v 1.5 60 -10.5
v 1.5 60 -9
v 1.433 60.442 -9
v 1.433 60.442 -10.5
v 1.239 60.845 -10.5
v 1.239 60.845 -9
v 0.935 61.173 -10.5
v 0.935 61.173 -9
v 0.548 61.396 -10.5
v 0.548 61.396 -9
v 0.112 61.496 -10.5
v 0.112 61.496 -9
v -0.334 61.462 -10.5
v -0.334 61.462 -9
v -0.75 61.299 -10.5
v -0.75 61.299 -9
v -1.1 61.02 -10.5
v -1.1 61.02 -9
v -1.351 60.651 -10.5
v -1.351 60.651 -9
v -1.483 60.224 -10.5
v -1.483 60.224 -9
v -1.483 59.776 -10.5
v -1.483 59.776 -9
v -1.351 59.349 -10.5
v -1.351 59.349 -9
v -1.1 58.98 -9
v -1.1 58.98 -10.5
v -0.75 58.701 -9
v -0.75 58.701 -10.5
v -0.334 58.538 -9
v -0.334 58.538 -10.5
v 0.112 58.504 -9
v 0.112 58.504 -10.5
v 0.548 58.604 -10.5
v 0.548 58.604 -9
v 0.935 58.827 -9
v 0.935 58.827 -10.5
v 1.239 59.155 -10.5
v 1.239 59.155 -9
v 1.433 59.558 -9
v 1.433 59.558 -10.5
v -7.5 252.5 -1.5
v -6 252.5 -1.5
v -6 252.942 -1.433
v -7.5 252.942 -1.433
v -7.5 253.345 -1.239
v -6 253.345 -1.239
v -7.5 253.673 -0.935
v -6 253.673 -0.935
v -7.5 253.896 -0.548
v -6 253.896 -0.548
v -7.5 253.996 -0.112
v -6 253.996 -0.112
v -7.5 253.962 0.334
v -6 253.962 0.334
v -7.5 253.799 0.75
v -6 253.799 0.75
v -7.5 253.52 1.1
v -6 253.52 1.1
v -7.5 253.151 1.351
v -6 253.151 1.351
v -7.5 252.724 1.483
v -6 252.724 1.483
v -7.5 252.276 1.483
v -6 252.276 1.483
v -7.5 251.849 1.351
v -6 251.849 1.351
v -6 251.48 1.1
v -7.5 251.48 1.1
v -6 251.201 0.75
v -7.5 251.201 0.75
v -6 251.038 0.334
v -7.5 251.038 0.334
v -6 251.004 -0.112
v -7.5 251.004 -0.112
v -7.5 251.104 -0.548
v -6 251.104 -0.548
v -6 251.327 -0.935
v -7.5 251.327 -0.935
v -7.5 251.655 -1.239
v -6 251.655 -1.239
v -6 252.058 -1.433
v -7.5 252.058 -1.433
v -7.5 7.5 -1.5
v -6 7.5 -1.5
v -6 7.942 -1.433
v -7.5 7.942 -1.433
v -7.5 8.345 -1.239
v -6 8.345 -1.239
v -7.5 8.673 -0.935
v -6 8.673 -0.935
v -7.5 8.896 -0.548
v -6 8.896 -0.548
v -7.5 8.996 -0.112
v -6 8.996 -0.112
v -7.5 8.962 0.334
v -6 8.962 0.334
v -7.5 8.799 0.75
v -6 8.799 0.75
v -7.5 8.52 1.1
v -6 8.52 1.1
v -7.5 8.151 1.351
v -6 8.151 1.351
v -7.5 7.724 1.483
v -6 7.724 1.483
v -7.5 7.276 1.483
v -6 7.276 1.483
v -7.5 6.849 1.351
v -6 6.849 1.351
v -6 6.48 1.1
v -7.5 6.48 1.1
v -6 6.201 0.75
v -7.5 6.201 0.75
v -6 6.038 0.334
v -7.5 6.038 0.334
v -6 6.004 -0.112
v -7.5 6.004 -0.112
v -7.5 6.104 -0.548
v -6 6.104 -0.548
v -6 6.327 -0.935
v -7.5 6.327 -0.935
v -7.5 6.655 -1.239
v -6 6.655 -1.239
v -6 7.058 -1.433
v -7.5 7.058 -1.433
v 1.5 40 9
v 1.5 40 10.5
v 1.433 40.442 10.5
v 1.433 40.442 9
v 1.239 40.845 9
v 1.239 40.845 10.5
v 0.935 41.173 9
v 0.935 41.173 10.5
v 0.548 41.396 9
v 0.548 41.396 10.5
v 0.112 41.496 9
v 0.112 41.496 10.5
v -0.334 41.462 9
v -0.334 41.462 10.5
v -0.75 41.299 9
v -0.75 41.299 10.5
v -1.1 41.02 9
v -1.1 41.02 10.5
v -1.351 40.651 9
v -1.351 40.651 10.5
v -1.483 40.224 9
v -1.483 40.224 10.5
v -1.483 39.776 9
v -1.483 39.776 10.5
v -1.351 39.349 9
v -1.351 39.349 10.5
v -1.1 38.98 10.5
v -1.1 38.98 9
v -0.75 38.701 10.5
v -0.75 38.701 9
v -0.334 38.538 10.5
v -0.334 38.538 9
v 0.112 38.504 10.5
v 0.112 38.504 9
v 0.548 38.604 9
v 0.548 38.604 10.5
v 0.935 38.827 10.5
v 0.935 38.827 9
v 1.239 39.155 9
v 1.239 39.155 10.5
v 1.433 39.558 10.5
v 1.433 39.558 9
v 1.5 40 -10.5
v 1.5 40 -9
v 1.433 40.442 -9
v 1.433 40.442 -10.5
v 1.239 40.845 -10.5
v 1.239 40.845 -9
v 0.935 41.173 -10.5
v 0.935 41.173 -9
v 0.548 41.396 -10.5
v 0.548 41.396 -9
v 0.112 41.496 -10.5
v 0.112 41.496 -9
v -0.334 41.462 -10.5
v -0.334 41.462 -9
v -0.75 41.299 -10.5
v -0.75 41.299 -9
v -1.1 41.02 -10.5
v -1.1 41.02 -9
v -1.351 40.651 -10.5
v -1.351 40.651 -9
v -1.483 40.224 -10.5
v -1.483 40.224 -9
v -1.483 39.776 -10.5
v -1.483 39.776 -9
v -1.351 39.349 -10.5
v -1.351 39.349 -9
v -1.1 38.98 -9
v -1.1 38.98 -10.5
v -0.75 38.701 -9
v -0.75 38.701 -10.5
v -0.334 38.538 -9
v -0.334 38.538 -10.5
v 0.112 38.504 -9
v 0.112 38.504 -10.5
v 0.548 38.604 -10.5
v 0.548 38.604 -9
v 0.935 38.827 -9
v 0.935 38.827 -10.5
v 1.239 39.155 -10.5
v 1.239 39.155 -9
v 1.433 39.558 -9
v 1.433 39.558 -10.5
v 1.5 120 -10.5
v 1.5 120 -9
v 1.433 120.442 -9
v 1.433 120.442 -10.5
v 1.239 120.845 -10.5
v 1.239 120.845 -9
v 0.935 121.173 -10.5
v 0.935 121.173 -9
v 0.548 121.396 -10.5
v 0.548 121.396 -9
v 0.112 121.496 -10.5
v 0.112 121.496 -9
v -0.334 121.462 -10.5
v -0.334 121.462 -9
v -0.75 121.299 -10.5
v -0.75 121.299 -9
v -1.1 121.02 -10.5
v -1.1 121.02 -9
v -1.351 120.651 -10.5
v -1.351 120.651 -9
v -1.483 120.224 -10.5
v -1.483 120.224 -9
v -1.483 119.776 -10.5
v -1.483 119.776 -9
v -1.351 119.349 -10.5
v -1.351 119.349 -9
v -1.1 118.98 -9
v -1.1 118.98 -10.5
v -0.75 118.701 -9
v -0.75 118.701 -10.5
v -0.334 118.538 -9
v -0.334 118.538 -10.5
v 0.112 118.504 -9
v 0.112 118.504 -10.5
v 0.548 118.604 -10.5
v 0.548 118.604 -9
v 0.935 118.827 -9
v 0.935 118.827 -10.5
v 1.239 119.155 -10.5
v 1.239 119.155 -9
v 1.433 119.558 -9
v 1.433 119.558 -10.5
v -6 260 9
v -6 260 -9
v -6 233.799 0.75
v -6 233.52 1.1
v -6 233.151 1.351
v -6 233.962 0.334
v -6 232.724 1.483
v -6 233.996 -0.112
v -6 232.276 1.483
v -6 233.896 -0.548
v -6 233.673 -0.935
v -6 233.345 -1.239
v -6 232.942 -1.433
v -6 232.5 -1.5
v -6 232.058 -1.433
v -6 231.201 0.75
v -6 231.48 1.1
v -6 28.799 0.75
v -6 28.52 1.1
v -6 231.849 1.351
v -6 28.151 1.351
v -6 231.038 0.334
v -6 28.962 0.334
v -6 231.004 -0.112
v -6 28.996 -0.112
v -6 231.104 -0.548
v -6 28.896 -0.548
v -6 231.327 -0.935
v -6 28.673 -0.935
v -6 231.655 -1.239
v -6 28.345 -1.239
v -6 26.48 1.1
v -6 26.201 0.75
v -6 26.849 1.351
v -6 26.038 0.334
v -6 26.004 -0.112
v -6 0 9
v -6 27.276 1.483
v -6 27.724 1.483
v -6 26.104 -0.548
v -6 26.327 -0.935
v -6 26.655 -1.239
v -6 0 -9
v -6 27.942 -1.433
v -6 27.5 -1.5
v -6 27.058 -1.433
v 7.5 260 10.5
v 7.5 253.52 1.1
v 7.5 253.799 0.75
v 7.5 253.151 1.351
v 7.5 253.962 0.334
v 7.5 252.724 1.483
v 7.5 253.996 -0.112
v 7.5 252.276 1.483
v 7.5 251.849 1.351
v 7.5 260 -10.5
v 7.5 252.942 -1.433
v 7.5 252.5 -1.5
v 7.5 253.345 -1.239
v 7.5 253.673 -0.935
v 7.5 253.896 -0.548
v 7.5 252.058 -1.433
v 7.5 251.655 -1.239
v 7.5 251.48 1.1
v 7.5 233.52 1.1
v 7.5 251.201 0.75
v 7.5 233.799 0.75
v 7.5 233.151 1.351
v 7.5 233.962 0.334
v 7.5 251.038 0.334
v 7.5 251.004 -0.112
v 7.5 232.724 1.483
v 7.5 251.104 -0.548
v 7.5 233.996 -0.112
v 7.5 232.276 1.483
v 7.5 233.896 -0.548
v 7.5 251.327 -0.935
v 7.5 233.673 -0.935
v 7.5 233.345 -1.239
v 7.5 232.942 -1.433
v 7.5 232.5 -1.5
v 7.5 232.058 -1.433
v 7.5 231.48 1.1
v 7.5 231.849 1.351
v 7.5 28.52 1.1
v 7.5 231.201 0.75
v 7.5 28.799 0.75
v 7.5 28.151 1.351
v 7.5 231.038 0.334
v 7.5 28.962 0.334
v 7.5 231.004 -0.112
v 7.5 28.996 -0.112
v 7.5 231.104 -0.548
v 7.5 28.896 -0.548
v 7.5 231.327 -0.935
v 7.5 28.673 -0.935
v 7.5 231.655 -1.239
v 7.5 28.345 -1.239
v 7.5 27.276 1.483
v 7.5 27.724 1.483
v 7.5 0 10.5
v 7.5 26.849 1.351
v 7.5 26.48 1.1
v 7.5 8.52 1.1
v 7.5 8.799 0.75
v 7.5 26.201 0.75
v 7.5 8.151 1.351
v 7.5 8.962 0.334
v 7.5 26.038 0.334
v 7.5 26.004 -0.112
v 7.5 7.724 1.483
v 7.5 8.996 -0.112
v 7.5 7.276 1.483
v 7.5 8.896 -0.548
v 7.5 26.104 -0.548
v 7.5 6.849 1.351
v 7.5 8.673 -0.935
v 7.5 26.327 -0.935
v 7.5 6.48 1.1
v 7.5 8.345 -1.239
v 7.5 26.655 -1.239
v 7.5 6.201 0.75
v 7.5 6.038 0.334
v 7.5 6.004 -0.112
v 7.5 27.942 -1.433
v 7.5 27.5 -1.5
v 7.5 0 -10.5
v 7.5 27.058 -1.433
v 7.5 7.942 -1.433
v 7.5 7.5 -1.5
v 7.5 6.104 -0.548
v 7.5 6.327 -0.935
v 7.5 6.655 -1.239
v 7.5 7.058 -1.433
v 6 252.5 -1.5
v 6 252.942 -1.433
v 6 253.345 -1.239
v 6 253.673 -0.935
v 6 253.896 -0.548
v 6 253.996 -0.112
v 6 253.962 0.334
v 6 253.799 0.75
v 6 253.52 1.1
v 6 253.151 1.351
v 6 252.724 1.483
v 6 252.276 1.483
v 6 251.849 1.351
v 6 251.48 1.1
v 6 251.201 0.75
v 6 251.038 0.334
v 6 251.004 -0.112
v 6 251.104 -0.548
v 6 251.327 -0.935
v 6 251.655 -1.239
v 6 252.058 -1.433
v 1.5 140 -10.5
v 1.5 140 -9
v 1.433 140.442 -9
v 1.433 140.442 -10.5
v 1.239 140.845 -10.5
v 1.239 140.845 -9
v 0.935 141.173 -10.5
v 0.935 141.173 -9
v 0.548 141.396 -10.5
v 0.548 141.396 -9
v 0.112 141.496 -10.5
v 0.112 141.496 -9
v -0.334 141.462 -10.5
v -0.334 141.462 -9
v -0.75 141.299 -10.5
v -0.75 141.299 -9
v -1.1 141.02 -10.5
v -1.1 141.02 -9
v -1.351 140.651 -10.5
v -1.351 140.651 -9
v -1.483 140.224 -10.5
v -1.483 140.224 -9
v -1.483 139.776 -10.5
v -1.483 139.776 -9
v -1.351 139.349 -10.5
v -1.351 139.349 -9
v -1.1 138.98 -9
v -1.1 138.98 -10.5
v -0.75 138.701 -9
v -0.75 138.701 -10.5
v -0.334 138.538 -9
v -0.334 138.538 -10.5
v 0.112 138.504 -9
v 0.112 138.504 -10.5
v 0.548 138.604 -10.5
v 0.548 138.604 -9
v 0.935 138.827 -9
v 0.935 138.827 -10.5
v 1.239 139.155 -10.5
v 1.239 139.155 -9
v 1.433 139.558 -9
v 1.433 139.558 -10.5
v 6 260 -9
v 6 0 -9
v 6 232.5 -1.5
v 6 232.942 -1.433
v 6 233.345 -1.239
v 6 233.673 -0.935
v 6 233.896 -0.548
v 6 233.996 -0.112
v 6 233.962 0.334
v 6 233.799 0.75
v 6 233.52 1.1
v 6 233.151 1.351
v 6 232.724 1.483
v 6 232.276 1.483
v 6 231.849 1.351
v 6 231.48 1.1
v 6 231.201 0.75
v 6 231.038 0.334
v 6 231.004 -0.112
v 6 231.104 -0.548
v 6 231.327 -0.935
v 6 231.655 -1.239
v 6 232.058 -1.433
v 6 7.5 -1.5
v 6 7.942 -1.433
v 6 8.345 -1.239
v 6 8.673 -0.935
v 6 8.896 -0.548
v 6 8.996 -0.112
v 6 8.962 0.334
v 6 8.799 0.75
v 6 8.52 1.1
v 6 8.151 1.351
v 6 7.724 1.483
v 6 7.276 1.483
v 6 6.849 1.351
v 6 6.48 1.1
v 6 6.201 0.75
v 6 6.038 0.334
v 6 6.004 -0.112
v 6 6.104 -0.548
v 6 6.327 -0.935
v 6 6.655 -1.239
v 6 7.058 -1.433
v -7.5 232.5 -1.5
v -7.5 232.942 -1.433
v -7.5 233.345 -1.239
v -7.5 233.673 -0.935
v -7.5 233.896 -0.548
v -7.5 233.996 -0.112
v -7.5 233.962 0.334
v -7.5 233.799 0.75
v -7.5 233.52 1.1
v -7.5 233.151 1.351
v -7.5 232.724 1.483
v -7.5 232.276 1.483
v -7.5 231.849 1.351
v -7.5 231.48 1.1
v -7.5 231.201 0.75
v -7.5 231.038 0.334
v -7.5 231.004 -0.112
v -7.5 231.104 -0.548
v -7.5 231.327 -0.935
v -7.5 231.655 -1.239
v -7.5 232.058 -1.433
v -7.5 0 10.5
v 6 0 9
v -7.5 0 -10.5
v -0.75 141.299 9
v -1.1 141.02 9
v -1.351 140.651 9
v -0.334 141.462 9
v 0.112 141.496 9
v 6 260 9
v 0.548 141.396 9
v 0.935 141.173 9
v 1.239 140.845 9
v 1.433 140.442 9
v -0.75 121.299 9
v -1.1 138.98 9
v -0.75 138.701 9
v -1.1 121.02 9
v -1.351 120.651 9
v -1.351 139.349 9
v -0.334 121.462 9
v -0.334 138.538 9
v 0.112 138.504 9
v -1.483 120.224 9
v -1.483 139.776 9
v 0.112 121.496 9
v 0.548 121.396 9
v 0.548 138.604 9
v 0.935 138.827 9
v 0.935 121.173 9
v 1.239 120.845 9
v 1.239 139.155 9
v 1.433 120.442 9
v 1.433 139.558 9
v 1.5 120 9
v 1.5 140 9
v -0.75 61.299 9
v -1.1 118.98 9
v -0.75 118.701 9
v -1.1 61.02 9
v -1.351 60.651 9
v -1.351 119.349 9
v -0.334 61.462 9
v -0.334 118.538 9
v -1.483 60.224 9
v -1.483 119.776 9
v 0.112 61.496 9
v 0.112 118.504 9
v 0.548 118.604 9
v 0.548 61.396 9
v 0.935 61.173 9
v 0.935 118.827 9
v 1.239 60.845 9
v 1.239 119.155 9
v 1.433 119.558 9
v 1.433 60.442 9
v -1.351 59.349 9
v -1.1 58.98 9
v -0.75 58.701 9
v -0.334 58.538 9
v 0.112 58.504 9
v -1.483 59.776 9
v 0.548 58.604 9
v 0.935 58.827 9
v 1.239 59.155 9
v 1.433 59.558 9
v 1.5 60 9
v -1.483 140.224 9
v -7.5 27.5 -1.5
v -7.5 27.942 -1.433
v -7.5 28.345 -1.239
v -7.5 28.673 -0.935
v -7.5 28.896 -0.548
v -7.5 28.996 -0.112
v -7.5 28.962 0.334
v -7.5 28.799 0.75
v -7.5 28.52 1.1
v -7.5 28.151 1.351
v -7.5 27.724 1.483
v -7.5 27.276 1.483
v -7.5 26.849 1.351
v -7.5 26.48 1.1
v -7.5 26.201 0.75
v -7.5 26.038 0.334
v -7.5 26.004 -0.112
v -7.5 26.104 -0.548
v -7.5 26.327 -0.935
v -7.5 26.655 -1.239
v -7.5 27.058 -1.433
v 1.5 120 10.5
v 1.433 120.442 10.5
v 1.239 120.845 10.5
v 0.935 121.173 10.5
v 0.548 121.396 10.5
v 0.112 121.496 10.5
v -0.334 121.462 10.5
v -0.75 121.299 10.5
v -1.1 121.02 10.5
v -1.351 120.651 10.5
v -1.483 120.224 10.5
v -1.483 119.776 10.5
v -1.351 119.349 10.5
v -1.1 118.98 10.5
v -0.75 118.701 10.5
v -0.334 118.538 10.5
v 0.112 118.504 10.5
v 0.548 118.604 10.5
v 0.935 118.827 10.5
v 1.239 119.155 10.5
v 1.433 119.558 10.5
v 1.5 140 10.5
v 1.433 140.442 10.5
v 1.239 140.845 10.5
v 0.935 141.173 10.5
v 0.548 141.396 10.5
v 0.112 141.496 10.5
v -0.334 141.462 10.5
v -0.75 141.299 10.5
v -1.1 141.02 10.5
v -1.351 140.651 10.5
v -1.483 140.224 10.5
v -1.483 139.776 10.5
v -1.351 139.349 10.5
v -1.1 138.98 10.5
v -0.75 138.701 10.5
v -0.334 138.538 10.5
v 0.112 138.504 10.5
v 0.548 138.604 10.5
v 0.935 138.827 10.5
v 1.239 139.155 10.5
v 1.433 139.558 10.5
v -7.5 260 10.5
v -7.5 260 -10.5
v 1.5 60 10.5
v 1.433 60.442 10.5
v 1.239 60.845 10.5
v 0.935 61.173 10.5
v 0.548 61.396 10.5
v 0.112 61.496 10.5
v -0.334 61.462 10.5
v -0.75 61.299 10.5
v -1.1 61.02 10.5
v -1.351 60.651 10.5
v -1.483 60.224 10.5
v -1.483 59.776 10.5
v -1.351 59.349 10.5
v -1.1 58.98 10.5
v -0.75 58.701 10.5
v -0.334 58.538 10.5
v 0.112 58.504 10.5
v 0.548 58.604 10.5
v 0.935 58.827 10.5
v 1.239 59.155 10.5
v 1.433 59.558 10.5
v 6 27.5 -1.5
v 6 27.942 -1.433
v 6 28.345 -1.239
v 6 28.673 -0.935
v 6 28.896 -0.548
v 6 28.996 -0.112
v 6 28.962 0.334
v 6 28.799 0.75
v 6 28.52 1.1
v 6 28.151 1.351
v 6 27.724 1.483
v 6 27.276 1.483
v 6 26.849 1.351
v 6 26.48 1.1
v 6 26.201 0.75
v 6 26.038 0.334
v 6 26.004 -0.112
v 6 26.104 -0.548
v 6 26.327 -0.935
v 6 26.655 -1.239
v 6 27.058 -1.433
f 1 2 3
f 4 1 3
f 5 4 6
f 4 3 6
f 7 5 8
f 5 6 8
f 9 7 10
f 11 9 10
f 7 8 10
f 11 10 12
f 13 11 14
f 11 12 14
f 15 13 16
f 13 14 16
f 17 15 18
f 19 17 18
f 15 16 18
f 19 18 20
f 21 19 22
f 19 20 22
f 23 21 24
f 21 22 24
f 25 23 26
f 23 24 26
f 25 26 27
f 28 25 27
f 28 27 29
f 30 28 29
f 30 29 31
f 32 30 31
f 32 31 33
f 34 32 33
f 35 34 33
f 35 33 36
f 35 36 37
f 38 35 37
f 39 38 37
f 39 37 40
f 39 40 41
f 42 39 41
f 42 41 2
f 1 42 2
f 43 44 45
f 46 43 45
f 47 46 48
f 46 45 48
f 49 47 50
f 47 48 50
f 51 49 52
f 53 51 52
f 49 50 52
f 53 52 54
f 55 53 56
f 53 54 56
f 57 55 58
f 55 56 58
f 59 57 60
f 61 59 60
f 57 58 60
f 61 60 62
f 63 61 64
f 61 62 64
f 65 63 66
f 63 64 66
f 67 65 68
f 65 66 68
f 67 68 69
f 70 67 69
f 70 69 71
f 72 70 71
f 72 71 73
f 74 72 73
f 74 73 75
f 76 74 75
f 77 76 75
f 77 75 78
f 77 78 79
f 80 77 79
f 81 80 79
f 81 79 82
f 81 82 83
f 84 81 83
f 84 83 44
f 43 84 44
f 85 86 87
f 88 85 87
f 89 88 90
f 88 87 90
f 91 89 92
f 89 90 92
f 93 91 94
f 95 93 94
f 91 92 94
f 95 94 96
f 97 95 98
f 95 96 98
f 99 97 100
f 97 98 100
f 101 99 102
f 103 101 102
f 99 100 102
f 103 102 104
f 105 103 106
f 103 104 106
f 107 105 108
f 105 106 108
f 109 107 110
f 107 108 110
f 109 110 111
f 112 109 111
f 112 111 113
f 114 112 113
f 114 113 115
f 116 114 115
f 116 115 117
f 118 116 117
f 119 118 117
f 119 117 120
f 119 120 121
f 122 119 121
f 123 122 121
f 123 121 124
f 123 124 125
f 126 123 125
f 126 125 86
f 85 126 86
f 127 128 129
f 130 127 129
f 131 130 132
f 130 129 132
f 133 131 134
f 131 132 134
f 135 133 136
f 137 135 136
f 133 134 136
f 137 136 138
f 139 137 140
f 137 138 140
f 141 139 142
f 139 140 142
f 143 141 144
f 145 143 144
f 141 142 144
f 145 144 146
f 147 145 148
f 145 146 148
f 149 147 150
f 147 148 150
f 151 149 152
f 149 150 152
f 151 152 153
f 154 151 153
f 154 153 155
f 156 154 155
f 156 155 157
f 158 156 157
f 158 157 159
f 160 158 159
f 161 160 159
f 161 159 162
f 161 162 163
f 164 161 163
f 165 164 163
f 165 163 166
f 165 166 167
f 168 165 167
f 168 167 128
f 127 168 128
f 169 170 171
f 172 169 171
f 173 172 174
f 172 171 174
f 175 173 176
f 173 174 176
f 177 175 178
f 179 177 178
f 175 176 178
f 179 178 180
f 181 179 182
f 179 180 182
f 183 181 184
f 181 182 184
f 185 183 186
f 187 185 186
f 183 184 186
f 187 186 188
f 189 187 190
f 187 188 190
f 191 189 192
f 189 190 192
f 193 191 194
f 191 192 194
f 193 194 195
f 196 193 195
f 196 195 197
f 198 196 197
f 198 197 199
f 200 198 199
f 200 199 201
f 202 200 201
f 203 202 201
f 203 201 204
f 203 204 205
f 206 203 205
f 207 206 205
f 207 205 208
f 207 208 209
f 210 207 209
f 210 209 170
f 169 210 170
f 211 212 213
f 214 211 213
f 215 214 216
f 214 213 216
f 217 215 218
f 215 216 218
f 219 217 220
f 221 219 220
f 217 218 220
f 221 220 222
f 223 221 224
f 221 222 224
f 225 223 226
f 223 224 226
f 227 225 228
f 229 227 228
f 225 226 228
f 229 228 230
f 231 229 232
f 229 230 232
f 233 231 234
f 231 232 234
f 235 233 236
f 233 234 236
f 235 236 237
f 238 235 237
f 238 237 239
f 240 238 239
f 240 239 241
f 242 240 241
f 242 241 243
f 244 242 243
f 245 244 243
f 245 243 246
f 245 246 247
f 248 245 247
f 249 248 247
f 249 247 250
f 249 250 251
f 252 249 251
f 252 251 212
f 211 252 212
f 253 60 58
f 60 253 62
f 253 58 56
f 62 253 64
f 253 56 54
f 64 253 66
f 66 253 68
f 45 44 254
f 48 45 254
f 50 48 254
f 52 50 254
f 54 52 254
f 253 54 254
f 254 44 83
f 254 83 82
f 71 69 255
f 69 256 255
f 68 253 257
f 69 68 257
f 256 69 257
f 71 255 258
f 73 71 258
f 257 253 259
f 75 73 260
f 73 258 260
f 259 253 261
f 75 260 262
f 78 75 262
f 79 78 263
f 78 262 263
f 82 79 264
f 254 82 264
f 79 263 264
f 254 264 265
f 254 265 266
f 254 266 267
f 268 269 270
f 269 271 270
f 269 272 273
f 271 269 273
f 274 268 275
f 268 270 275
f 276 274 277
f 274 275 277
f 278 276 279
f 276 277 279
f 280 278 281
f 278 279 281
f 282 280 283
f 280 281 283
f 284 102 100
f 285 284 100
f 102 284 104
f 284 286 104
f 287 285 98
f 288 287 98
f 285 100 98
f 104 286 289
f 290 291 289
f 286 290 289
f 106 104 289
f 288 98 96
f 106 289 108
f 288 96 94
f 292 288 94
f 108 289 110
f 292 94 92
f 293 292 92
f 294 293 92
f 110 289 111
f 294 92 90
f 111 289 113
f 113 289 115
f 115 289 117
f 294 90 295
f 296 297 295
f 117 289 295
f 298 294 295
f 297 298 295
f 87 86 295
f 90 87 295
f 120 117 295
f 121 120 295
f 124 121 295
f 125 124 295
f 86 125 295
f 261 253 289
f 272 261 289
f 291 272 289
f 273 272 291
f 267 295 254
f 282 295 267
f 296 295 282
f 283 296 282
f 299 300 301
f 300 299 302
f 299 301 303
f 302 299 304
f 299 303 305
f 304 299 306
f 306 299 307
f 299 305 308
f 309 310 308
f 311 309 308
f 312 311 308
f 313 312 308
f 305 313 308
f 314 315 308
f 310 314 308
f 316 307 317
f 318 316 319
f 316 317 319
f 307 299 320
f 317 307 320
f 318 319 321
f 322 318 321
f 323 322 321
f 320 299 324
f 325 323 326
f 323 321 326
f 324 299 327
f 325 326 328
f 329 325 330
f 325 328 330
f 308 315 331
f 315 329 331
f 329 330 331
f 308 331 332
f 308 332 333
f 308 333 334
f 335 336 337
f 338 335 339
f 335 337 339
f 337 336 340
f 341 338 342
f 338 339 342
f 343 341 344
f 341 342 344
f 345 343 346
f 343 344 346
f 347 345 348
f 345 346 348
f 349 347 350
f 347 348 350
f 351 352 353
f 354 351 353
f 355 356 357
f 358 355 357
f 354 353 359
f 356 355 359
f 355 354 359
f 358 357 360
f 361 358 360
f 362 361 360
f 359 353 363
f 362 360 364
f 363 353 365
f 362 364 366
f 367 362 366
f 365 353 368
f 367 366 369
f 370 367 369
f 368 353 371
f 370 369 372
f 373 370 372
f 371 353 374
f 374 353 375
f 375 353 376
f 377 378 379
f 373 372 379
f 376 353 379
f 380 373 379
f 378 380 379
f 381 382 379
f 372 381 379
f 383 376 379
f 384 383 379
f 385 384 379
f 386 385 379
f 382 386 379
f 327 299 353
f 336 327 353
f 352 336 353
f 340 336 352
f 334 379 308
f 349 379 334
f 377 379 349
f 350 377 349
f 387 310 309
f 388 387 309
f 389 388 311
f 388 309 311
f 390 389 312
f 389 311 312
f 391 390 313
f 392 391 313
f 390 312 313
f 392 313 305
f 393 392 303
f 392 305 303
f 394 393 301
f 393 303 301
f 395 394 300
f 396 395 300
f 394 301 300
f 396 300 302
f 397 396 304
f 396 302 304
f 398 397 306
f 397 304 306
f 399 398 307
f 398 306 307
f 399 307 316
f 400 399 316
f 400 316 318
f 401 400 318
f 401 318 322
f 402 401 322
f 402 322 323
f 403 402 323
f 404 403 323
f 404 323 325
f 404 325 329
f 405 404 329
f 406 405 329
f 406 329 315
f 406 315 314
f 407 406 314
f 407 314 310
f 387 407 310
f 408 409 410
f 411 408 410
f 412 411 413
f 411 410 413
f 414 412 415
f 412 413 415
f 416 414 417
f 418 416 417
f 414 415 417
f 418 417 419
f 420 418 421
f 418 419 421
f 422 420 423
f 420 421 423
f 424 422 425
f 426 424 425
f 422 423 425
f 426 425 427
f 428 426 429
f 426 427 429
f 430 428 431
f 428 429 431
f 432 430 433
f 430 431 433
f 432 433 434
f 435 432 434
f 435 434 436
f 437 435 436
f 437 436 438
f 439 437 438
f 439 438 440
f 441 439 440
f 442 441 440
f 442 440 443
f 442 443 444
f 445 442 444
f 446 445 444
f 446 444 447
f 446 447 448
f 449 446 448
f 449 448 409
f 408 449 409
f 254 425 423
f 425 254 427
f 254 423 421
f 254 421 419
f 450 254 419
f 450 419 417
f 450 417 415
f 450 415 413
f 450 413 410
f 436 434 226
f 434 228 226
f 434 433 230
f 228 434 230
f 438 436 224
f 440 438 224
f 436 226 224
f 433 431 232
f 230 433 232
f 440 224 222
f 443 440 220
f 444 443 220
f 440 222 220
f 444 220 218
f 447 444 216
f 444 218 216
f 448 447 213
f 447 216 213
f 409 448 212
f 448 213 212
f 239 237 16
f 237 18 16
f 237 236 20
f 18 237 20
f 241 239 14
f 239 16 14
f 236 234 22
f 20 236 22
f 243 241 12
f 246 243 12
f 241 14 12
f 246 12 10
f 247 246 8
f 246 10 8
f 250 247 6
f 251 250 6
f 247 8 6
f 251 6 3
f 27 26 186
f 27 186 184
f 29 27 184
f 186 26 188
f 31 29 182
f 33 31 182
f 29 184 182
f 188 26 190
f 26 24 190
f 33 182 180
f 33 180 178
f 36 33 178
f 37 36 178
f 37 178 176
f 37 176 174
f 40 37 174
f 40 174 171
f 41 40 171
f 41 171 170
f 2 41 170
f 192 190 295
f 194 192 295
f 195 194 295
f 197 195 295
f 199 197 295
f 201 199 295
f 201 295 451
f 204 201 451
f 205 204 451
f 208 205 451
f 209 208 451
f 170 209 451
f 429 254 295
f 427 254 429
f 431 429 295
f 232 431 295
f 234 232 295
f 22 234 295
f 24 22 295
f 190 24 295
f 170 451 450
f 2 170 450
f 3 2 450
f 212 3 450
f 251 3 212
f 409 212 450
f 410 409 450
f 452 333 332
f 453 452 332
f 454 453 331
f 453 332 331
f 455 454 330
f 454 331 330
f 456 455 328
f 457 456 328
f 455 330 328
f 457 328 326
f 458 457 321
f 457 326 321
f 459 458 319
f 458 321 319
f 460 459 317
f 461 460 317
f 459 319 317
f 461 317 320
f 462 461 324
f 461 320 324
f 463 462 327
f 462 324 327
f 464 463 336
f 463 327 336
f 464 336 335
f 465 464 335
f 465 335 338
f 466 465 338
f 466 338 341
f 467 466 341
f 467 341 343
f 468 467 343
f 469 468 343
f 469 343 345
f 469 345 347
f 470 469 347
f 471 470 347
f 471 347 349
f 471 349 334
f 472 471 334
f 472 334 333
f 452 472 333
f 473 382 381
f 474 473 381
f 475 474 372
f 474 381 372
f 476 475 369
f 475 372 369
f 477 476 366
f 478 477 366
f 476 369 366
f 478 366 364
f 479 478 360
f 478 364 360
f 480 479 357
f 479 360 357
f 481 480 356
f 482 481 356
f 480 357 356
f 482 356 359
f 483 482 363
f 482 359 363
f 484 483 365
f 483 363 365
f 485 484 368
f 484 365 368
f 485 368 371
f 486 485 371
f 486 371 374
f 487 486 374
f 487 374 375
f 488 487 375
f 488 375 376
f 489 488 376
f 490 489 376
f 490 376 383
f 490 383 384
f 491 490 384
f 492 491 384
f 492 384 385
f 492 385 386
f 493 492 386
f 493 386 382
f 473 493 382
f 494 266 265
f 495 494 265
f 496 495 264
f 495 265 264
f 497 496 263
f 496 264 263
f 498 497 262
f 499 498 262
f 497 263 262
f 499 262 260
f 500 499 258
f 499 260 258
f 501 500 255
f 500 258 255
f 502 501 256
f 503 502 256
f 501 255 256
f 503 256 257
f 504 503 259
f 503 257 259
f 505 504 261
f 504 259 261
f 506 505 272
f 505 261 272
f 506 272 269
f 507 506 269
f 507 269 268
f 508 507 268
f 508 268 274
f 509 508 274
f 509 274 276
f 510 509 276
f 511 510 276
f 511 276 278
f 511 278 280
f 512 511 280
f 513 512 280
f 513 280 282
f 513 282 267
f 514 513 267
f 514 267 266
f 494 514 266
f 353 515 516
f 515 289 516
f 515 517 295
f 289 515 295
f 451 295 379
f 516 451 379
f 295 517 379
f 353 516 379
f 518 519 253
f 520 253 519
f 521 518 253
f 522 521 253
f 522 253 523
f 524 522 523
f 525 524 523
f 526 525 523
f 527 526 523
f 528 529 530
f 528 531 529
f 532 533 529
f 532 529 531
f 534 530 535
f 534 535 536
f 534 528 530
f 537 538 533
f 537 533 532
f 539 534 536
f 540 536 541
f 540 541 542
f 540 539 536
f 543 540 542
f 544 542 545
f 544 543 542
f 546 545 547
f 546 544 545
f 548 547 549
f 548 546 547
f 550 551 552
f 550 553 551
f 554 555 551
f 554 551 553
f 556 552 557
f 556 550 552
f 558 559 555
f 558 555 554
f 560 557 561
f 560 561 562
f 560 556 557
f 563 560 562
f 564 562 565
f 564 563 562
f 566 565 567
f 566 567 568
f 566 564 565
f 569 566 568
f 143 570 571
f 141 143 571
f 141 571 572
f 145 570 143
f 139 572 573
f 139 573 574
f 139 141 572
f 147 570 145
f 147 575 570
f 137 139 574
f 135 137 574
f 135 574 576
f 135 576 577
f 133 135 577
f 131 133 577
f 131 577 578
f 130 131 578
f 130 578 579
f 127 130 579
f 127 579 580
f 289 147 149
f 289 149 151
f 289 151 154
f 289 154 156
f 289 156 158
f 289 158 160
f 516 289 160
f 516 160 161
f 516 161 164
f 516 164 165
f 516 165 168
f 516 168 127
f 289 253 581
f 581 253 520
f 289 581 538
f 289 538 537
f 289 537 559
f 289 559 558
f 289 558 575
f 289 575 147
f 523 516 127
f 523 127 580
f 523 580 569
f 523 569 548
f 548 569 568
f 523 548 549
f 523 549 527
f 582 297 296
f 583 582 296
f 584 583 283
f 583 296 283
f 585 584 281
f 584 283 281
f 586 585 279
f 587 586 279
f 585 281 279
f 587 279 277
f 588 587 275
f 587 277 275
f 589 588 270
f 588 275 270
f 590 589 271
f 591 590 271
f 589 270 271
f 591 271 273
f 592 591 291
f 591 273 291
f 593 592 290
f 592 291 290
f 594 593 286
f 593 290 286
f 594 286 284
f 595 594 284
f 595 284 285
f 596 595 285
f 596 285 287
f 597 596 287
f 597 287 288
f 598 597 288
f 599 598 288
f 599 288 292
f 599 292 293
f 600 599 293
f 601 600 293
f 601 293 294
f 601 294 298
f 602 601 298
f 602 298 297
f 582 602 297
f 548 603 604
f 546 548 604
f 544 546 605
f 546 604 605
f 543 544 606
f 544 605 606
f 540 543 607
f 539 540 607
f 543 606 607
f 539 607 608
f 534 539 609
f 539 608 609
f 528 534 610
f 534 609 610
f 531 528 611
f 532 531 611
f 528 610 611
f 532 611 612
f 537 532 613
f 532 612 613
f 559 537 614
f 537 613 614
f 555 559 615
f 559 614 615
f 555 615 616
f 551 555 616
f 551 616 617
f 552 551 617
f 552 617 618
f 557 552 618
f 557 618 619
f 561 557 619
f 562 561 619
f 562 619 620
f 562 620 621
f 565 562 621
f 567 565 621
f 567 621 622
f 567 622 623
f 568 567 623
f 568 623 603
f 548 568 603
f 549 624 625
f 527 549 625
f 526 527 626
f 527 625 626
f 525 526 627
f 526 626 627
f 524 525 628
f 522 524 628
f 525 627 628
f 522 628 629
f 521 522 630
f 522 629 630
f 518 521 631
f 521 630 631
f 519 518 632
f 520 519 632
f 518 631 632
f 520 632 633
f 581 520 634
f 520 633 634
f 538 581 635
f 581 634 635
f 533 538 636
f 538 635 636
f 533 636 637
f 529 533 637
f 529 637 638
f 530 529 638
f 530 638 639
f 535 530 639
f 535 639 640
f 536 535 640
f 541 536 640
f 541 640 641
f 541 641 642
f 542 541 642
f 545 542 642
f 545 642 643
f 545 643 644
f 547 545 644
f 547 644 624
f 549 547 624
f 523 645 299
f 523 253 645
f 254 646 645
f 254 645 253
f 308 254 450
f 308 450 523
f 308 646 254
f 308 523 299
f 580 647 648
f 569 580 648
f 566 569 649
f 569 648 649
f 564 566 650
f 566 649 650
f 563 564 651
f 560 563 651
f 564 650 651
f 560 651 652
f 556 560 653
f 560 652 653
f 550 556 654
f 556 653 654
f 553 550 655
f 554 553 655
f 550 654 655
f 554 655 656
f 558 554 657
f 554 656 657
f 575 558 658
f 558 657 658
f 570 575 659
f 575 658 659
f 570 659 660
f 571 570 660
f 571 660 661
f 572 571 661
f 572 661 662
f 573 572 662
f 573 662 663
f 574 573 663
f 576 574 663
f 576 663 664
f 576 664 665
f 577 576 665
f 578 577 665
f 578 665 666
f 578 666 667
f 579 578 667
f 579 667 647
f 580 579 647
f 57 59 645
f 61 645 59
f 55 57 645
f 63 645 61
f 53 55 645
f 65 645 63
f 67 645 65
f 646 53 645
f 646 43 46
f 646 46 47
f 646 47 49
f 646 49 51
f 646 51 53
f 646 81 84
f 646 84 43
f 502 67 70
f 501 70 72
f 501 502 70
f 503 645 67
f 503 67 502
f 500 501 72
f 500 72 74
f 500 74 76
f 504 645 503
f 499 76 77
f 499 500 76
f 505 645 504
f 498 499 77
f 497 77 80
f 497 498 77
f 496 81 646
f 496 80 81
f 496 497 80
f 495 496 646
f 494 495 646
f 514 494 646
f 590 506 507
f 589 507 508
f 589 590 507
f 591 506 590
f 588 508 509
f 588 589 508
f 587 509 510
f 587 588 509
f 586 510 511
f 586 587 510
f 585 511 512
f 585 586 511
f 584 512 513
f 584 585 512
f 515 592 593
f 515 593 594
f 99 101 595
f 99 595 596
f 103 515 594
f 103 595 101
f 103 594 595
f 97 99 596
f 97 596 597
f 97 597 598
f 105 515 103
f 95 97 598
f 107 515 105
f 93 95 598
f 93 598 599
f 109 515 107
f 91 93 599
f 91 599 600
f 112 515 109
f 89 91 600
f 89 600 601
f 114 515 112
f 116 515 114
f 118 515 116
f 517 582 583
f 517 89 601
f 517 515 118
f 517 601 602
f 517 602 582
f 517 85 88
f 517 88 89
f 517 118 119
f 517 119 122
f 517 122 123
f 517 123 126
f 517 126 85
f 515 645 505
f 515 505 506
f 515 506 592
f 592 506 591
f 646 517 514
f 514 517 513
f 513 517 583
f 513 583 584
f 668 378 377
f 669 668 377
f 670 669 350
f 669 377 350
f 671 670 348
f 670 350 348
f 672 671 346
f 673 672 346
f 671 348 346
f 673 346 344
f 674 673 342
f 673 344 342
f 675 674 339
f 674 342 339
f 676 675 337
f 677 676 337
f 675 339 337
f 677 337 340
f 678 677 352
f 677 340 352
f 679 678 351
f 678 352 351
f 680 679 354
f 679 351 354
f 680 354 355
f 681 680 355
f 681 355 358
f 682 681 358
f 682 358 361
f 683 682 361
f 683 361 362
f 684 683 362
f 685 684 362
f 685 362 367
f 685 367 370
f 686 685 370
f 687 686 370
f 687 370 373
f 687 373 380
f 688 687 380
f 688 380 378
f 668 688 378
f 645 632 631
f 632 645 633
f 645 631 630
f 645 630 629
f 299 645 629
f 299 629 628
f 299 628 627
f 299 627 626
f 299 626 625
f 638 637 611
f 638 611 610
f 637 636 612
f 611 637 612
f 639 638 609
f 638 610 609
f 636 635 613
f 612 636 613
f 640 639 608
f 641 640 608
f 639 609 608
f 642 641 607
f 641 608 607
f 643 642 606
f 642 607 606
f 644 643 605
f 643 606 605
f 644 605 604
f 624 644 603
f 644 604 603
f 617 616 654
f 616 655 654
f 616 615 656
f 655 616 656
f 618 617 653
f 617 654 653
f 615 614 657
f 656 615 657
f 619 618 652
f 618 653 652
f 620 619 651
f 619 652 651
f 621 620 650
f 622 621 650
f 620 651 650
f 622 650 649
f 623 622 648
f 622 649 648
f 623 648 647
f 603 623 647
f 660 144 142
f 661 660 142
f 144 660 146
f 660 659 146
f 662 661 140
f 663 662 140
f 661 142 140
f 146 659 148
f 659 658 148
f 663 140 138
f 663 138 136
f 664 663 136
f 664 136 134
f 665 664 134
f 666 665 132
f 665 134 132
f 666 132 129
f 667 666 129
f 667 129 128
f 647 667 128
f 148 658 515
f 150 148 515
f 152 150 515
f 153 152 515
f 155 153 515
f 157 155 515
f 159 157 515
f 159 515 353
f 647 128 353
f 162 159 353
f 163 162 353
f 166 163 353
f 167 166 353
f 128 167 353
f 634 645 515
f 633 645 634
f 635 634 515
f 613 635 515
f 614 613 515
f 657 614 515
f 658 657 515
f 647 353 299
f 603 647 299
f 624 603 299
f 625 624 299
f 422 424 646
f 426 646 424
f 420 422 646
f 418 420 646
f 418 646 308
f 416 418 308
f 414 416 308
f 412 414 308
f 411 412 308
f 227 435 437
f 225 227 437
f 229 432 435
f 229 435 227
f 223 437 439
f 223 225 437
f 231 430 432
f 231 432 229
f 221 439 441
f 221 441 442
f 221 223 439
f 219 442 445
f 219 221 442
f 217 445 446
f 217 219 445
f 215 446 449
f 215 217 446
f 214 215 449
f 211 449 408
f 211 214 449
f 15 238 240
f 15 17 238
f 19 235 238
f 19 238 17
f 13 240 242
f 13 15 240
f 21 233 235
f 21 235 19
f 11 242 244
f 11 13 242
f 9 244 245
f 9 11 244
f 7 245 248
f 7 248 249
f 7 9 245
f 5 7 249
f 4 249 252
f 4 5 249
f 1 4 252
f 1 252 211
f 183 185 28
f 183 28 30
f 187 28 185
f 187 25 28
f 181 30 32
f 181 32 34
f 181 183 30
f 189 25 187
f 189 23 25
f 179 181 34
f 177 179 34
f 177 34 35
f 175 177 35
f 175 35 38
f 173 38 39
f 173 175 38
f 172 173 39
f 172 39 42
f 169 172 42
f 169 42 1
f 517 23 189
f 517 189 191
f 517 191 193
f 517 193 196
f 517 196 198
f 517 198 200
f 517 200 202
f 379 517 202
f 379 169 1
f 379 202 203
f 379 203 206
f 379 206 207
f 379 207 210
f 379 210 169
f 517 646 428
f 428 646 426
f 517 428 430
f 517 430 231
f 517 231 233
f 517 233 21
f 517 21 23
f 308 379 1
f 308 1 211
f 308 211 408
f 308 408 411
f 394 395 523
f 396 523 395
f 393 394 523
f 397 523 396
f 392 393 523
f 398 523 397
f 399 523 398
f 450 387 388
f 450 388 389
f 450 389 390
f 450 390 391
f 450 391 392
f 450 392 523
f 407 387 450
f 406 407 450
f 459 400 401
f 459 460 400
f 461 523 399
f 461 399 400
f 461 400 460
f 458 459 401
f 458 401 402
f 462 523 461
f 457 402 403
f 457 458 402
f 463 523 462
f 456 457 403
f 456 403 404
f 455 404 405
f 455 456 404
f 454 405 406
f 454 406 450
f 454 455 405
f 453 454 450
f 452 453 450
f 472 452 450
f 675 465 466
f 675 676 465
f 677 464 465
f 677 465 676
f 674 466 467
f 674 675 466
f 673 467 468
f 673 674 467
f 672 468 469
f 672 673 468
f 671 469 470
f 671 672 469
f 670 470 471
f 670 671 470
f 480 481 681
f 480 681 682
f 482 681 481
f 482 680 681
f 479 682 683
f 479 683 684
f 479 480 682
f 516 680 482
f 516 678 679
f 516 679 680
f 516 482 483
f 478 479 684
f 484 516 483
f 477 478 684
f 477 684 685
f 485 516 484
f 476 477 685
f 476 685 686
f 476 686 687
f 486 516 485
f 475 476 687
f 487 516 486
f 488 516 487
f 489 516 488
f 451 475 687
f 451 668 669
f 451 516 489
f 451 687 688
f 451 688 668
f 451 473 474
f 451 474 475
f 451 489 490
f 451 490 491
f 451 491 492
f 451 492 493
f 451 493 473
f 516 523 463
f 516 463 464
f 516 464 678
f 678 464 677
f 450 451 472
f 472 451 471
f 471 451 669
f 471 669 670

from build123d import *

# Parameters (mm, degrees)
SKETCH_1_W          = 15
SKETCH_1_H          = 21
SKETCH_1_W_2        = 12
SKETCH_1_H_2        = 18
EXTRUDE_1_DEPTH     = 260
SKETCH_4_R          = 1.5
CUT_EXTRUDE_2_DEPTH = 261.643914182
SKETCH_5_R          = 1.5
CUT_EXTRUDE_3_DEPTH = 261.954497949


with BuildPart() as part:
    # 草图1 → 拉伸-薄壁1 (new body)
    with BuildSketch(Plane(origin=(0, 0, 0), x_dir=(1, 0, 0), z_dir=(0, 1, 0))):
        Rectangle(SKETCH_1_W, SKETCH_1_H)
        Rectangle(SKETCH_1_W_2, SKETCH_1_H_2, mode=Mode.SUBTRACT)
    extrude(amount=EXTRUDE_1_DEPTH)

    # 草图4 → 切除-拉伸2 (cut, through all)
    with BuildSketch(Plane(origin=(7.5, 0, 0), x_dir=(0, 0, -1), z_dir=(1, 0, 0))):
        with Locations((0, 252.5)):
            Circle(SKETCH_4_R)
        with Locations((0, 232.5)):
            Circle(SKETCH_4_R)
        with Locations((0, 27.5)):
            Circle(SKETCH_4_R)
        with Locations((0, 7.5)):
            Circle(SKETCH_4_R)
    extrude(amount=-CUT_EXTRUDE_2_DEPTH, mode=Mode.SUBTRACT)

    # 草图5 → 切除-拉伸3 (cut, through all)
    with BuildSketch(Plane.XY.offset(10.5)):
        with Locations((0, 40)):
            Circle(SKETCH_5_R)
        with Locations((0, 60)):
            Circle(SKETCH_5_R)
        with Locations((0, 120)):
            Circle(SKETCH_5_R)
        with Locations((0, 140)):
            Circle(SKETCH_5_R)
    extrude(amount=-CUT_EXTRUDE_3_DEPTH, mode=Mode.SUBTRACT)


solid = part.part
